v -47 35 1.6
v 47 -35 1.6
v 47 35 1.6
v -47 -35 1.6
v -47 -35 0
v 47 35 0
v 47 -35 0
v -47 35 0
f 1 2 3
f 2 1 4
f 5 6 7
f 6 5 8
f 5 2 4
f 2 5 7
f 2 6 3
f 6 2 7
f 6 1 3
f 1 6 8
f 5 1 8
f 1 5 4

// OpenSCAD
// Seed OpenSCAD file for task 05; complete it from 01_kicad_mechanical_map.csv.
$fn = 32;
board = [94.000, 70.000, 1.600];
wall = 2.800;
module placeholder_board() {
  translate([-board[0]/2, -board[1]/2, 0]) cube(board);
}
placeholder_board();
